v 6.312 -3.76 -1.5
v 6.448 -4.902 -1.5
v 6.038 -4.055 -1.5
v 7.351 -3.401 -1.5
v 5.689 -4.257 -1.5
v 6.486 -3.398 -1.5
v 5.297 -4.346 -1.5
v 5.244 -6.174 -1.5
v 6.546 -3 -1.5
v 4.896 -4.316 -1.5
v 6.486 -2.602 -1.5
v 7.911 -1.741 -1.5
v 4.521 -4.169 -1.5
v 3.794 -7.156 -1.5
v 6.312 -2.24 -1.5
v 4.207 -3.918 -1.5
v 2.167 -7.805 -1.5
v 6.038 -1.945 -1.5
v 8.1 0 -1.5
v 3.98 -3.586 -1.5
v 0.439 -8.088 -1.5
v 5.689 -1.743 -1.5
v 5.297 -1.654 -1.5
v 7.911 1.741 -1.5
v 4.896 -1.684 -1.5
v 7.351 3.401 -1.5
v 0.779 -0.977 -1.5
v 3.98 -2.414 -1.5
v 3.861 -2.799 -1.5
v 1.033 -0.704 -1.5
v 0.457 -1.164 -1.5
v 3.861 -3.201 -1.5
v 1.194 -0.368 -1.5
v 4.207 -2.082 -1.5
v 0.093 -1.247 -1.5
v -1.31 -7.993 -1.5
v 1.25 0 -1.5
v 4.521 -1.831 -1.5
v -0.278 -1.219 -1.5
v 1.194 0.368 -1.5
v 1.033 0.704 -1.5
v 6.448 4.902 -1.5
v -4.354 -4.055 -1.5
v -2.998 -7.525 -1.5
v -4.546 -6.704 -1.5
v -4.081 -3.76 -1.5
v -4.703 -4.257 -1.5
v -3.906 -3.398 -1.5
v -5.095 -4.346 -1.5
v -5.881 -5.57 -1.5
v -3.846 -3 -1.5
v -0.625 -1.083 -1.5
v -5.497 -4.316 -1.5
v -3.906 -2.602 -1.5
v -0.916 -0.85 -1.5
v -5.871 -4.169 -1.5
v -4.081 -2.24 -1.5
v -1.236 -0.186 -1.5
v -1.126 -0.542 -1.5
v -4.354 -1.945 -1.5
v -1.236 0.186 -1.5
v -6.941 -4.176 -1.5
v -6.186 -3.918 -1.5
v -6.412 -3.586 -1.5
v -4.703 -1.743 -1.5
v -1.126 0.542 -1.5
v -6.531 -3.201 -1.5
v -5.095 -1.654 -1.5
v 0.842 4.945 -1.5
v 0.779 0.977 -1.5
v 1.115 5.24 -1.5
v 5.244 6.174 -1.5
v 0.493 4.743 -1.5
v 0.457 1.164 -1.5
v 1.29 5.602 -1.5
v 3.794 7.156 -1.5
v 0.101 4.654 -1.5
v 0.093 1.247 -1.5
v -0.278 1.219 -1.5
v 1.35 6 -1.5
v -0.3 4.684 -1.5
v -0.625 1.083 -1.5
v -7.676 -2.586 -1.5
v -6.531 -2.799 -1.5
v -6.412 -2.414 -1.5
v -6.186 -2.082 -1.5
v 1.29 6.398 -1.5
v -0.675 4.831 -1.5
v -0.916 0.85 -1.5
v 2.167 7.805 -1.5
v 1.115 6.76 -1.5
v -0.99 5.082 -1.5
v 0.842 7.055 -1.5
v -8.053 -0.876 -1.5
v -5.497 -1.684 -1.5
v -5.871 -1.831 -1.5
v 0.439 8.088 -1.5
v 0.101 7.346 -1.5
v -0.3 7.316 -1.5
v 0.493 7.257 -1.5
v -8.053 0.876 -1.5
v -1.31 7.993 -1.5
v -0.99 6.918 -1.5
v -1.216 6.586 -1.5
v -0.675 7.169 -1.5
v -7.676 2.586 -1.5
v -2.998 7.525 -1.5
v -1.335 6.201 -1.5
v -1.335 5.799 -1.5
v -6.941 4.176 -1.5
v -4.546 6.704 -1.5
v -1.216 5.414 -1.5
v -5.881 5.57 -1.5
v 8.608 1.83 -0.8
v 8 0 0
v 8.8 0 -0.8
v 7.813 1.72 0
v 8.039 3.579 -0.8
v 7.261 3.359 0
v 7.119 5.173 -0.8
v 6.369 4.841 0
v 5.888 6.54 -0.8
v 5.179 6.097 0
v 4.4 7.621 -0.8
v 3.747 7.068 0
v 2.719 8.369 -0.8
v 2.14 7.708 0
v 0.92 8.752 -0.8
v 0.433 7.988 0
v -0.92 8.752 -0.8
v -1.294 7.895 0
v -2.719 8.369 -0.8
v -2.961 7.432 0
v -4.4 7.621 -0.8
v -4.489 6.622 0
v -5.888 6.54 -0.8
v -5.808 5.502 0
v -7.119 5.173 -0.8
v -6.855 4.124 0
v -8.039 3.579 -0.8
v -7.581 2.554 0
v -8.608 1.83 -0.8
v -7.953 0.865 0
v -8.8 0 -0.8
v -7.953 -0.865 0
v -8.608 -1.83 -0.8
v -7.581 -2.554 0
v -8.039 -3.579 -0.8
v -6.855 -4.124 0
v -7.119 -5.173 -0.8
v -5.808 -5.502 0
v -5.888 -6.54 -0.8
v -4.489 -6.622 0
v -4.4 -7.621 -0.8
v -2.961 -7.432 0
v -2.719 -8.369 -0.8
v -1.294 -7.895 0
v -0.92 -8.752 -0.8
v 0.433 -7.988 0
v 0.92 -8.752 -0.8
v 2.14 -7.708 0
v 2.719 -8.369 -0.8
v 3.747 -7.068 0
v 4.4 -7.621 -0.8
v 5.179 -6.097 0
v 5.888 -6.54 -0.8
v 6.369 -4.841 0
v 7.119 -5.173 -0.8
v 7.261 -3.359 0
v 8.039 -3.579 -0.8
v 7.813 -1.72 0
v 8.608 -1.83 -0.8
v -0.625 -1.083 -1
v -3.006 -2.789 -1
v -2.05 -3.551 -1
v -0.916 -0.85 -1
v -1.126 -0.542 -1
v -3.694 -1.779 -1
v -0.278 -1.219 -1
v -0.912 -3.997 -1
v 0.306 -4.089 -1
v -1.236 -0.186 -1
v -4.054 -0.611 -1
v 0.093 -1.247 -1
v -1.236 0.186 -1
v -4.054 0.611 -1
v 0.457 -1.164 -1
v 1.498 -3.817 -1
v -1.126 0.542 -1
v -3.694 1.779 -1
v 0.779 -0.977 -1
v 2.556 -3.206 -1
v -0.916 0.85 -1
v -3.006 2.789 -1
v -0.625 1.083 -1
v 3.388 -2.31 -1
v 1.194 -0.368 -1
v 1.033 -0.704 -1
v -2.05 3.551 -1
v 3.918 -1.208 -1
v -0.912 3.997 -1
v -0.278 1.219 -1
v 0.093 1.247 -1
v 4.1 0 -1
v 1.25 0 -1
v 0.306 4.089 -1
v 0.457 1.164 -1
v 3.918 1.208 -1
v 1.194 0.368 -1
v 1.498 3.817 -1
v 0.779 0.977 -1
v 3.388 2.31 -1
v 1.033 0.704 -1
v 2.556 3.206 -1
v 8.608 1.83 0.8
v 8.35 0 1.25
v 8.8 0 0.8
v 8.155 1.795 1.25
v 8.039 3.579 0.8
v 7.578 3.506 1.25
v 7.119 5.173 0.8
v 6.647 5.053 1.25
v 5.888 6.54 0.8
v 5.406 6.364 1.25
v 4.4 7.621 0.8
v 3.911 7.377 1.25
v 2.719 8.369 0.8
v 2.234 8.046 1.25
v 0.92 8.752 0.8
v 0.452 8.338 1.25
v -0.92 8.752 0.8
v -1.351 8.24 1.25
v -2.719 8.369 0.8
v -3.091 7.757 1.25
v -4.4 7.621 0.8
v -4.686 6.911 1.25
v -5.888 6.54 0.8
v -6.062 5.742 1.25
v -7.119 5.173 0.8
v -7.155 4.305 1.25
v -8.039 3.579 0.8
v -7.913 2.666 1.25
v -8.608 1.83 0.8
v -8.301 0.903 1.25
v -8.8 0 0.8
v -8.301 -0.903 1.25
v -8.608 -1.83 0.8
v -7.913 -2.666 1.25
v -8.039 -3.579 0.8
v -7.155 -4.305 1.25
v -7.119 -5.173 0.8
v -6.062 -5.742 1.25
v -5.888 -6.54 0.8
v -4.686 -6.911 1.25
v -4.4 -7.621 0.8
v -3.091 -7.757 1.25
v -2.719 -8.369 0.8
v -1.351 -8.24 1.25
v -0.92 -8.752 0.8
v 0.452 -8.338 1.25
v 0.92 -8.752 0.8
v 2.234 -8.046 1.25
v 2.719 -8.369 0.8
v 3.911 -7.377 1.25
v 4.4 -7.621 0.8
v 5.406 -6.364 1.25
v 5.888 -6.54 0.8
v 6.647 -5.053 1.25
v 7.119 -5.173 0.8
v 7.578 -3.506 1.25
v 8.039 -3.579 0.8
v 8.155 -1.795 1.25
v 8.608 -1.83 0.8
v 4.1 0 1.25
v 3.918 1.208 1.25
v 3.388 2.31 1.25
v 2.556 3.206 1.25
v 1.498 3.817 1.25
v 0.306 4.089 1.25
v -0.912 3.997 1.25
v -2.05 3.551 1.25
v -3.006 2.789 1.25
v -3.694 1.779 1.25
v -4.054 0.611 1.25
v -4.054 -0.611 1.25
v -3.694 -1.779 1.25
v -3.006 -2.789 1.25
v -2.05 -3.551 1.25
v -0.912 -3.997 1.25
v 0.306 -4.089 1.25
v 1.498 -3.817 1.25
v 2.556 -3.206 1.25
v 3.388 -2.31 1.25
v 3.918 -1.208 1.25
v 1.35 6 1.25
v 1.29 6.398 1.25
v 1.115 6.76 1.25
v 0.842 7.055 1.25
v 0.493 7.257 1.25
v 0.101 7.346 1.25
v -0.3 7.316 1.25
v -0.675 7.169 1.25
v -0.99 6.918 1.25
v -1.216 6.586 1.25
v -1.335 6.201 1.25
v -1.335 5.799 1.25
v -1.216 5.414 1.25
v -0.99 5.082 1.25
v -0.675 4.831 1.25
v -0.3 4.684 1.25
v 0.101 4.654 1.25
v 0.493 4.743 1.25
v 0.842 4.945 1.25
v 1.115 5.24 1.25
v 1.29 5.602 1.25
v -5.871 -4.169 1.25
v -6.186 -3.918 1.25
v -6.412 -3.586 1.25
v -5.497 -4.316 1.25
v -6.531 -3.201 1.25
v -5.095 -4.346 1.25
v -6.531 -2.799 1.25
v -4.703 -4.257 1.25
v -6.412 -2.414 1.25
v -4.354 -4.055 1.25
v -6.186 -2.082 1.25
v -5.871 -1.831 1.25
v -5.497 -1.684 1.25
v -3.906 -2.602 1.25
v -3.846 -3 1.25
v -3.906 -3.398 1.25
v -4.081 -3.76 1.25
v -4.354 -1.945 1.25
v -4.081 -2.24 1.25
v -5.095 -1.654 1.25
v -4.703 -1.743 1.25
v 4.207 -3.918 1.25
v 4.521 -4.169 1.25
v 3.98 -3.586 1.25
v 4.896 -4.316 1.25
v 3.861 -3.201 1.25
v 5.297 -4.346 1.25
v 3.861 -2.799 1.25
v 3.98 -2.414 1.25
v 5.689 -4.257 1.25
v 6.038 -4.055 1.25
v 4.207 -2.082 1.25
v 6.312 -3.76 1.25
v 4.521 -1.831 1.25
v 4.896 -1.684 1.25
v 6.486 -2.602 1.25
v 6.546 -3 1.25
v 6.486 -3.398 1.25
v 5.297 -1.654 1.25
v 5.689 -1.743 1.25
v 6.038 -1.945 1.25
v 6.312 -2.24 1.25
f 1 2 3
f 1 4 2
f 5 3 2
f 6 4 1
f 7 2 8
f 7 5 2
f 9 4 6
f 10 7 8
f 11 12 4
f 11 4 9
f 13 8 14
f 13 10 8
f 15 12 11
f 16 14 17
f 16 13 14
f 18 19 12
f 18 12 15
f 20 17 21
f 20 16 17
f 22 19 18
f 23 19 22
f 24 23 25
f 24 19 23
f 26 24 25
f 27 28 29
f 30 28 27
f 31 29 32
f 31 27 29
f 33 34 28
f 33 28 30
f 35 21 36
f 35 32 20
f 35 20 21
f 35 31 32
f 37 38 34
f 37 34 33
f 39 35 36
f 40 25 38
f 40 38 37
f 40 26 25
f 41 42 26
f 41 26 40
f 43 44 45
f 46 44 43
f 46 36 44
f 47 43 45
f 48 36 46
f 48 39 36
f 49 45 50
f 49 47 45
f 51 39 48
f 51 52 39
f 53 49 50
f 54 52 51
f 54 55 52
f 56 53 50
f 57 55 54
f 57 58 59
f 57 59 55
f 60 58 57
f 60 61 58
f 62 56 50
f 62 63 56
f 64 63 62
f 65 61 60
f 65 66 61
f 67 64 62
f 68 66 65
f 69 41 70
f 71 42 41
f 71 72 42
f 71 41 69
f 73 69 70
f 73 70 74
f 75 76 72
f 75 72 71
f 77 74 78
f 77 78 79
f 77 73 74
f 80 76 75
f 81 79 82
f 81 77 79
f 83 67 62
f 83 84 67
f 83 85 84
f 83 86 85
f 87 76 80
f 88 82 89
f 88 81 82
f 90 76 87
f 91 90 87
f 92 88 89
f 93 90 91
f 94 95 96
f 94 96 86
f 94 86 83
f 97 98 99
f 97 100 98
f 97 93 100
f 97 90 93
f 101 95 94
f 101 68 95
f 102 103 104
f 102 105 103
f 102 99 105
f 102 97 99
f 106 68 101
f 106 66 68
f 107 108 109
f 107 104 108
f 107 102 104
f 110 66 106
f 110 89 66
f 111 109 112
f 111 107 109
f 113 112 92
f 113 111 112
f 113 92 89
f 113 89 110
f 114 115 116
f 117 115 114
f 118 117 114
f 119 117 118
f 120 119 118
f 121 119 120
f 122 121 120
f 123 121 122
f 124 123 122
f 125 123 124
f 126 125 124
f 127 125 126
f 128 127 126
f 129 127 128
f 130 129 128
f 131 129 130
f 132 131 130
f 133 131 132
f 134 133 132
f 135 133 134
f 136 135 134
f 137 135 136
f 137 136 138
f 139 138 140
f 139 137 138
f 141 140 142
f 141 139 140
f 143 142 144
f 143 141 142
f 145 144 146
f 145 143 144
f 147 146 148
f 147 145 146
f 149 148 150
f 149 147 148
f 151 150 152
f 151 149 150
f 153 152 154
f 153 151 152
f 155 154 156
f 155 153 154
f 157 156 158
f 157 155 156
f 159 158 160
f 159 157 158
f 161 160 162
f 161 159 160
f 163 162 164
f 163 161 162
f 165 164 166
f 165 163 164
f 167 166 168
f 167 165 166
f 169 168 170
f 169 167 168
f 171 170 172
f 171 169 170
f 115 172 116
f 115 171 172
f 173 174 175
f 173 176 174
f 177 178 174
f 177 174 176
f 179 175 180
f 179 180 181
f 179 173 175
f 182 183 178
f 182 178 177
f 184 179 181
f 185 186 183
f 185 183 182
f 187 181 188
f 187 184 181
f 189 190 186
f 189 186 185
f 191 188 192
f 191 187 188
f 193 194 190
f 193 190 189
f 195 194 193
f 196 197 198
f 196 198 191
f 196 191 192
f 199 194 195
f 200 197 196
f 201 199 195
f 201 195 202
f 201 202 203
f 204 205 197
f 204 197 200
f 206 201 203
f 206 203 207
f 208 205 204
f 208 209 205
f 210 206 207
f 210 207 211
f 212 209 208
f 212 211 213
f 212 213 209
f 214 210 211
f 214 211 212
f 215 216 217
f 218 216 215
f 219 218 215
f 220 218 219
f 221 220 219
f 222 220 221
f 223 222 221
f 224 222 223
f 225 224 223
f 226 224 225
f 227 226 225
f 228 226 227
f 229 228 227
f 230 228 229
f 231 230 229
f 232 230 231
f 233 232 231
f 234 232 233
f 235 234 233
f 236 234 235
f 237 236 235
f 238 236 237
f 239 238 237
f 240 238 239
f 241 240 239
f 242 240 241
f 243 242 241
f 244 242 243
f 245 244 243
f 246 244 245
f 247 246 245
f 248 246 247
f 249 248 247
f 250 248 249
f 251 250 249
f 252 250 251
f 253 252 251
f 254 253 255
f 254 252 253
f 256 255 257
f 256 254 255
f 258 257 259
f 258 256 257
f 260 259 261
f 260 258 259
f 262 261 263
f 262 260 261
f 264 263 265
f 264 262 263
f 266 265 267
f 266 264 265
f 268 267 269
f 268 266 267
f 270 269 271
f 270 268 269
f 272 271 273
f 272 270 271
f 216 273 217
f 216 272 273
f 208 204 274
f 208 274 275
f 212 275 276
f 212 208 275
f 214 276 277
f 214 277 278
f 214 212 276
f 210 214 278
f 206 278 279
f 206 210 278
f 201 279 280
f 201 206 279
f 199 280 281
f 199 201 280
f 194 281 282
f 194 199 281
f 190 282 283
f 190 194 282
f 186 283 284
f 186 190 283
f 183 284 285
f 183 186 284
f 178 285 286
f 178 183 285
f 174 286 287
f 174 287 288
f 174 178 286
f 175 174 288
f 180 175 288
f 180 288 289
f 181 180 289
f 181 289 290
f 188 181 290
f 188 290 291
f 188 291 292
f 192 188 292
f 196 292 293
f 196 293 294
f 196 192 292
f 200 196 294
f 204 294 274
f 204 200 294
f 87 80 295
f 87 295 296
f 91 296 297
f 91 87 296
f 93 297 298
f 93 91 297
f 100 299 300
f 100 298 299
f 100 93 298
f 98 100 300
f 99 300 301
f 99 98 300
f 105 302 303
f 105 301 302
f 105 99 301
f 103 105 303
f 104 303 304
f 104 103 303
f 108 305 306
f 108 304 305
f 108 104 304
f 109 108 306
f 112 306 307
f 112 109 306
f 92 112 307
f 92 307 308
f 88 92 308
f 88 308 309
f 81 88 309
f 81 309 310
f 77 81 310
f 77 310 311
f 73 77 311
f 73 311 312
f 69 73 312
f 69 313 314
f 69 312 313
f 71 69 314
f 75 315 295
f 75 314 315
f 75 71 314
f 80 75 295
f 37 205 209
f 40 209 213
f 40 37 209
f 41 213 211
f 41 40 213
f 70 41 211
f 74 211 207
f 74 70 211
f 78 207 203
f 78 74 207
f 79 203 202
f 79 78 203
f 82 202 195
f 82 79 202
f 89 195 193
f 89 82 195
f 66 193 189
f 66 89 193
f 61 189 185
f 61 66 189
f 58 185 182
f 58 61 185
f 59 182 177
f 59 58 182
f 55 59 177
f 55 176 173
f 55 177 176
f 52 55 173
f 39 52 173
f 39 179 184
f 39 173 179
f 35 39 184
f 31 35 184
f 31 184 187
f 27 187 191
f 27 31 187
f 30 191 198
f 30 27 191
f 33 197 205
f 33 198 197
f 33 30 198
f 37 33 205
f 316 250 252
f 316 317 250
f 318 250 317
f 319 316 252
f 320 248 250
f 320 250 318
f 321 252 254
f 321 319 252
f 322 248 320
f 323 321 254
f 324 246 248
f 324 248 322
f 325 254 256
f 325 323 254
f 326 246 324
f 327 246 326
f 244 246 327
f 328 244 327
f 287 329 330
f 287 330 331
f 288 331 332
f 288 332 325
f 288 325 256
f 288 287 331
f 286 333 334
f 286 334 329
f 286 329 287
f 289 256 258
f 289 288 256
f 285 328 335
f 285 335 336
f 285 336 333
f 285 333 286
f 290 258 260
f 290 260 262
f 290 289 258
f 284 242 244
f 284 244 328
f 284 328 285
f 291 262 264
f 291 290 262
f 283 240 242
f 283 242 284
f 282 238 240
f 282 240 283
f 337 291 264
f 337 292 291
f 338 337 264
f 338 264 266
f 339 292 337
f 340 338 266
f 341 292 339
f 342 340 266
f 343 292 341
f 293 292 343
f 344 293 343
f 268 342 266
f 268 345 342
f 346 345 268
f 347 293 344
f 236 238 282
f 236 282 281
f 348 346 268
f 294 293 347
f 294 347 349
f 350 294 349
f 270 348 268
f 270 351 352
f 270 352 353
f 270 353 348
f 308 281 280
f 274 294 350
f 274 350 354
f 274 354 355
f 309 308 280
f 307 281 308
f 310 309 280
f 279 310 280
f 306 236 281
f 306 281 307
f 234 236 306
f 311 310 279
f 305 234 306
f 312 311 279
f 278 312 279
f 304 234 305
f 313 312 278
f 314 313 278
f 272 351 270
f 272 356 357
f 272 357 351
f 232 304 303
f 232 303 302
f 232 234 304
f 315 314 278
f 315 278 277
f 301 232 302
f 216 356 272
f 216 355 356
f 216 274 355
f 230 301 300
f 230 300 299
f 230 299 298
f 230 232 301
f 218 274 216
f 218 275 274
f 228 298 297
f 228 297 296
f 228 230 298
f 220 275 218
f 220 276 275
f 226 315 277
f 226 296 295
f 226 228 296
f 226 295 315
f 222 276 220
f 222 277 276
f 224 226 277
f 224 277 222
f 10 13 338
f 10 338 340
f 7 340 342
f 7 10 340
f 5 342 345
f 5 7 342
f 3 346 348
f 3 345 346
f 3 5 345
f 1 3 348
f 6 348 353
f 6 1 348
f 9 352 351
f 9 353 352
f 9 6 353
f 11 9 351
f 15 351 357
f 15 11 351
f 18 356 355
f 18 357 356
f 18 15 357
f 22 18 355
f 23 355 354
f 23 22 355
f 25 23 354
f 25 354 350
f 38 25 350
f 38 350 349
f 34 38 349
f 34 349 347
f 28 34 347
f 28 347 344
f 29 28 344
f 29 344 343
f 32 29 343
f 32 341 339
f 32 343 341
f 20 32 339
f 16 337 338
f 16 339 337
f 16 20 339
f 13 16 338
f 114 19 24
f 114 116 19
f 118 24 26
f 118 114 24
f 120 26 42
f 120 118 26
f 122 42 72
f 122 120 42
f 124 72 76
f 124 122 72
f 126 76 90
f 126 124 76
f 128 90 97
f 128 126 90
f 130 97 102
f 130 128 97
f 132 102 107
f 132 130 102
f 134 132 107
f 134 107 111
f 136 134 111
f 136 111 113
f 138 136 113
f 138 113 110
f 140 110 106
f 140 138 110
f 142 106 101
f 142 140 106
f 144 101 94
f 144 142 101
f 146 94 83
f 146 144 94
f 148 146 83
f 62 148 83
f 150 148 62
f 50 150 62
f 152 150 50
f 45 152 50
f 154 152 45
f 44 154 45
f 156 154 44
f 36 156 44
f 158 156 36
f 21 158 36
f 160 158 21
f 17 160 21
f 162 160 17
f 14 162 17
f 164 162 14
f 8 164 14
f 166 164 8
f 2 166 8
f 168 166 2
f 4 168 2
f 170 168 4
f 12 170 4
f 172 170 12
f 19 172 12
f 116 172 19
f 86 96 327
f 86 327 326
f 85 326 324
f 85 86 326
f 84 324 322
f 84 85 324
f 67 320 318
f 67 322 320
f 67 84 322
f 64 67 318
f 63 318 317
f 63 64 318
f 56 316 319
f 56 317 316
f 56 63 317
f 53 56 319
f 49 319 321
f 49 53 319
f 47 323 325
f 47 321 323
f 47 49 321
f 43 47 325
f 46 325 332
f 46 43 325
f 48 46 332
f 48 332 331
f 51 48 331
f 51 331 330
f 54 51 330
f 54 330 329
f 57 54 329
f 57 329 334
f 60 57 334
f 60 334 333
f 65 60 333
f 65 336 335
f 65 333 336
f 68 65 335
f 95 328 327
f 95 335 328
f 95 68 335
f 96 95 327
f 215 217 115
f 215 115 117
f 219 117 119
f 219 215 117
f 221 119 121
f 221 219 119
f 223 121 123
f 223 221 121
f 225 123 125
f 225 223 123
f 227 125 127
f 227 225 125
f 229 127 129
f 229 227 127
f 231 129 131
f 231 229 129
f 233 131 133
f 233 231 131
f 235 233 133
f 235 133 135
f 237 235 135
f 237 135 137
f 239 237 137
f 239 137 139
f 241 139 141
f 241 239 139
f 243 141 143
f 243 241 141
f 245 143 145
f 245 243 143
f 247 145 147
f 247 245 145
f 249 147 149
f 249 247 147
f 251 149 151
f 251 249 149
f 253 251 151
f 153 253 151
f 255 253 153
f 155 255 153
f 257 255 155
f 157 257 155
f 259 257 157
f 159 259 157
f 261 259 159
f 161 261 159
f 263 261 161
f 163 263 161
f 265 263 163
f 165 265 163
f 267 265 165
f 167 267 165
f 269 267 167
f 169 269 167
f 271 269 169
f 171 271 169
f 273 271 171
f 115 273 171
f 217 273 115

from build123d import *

# Parameters (mm, degrees)
CYLINDER002_R     = 20
CYLINDER002_DEPTH = 20
CYLINDER001_R     = 1.35
CYLINDER001_DEPTH = 10
ARRAY001_COUNT    = 3
CYLINDER_R        = 4.1
CYLINDER_DEPTH    = 2.25
SKETCH002_W       = 5
SKETCH002_H       = 4.7
ARRAY_Z_COUNT     = 6
ARRAY_Z_PITCH     = 1.6


with BuildPart() as clone_of_upperdomain:
    # Cylinder002 → Cylinder002 (new body)
    with BuildSketch(Plane.XY.offset(1.25)):
        Circle(CYLINDER002_R)
    extrude(amount=CYLINDER002_DEPTH)


with BuildPart() as dins913:
    # Cylinder001 → Cylinder001 (new body)
    with BuildSketch(Plane(origin=(0, 6, -4), x_dir=(1, 0, 0), z_dir=(0, 0, 1))):
        Circle(CYLINDER001_R)
    extrude(amount=CYLINDER001_DEPTH)

    # Array001: DINs913 ×3 about axis
    array001_axis = Axis((0, 0, 0), (0, 0, 1))


with BuildPart() as dins913_1:
    add(dins913.part)
    for i in range(1, ARRAY001_COUNT):
        add(dins913.part.rotate(array001_axis, i * 360 / ARRAY001_COUNT))


with BuildPart() as lensfit:
    # Cylinder → Cylinder (new body)
    with BuildSketch(Plane.XY.offset(-1)):
        Circle(CYLINDER_R)
    extrude(amount=CYLINDER_DEPTH)


with BuildPart() as innergroovedom001:
    # Sketch002 → Revolution002 (revolve)
    with BuildSketch(Plane.XZ):
        with Locations((7.5, 0.85)):
            Rectangle(SKETCH002_W, SKETCH002_H)
    revolve(axis=Axis((0, 0, 0), (0, 0, 1)))


with BuildPart() as innergroovetool:
    # Sketch001 → Revolution001 (revolve)
    with BuildSketch(Plane.XZ):
        Polygon((4, 3.2), (4, 1.6), (8, 1.6), (8.8, 2.4), (8, 3.2), align=None)
    revolve(axis=Axis((0, 0, 0), (0, 0, 1)))

    # Array Z: InnerGrooveTool ×6


with BuildPart() as innergroovetool_1:
    add(innergroovetool.part)
    with Locations(*[(0, 0, -i * ARRAY_Z_PITCH) for i in range(1, ARRAY_Z_COUNT)]):
        add(innergroovetool.part)

    # Common: intersect InnerGrooveDom001
    add(innergroovedom001.part, mode=Mode.INTERSECT)


with BuildPart() as adaptor:
    # Sketch → Revolution (revolve)
    with BuildSketch(Plane.XZ):
        Polygon((1.25, 4), (1.25, -1.5), (8, -1.5), (8, 3.2), (5, 3.2), (5, 4), align=None)
    revolve(axis=Axis((0, 0, 0), (0, 0, 1)))

    # Fusion001: union InnerGrooveTool
    add(innergroovetool_1.part)

    # Cut: cut LensFit
    add(lensfit.part, mode=Mode.SUBTRACT)

    # Cut001: cut DINs913
    add(dins913_1.part, mode=Mode.SUBTRACT)

    # Cut002: cut Clone of UpperDomain
    add(clone_of_upperdomain.part, mode=Mode.SUBTRACT)


solid = adaptor.part
